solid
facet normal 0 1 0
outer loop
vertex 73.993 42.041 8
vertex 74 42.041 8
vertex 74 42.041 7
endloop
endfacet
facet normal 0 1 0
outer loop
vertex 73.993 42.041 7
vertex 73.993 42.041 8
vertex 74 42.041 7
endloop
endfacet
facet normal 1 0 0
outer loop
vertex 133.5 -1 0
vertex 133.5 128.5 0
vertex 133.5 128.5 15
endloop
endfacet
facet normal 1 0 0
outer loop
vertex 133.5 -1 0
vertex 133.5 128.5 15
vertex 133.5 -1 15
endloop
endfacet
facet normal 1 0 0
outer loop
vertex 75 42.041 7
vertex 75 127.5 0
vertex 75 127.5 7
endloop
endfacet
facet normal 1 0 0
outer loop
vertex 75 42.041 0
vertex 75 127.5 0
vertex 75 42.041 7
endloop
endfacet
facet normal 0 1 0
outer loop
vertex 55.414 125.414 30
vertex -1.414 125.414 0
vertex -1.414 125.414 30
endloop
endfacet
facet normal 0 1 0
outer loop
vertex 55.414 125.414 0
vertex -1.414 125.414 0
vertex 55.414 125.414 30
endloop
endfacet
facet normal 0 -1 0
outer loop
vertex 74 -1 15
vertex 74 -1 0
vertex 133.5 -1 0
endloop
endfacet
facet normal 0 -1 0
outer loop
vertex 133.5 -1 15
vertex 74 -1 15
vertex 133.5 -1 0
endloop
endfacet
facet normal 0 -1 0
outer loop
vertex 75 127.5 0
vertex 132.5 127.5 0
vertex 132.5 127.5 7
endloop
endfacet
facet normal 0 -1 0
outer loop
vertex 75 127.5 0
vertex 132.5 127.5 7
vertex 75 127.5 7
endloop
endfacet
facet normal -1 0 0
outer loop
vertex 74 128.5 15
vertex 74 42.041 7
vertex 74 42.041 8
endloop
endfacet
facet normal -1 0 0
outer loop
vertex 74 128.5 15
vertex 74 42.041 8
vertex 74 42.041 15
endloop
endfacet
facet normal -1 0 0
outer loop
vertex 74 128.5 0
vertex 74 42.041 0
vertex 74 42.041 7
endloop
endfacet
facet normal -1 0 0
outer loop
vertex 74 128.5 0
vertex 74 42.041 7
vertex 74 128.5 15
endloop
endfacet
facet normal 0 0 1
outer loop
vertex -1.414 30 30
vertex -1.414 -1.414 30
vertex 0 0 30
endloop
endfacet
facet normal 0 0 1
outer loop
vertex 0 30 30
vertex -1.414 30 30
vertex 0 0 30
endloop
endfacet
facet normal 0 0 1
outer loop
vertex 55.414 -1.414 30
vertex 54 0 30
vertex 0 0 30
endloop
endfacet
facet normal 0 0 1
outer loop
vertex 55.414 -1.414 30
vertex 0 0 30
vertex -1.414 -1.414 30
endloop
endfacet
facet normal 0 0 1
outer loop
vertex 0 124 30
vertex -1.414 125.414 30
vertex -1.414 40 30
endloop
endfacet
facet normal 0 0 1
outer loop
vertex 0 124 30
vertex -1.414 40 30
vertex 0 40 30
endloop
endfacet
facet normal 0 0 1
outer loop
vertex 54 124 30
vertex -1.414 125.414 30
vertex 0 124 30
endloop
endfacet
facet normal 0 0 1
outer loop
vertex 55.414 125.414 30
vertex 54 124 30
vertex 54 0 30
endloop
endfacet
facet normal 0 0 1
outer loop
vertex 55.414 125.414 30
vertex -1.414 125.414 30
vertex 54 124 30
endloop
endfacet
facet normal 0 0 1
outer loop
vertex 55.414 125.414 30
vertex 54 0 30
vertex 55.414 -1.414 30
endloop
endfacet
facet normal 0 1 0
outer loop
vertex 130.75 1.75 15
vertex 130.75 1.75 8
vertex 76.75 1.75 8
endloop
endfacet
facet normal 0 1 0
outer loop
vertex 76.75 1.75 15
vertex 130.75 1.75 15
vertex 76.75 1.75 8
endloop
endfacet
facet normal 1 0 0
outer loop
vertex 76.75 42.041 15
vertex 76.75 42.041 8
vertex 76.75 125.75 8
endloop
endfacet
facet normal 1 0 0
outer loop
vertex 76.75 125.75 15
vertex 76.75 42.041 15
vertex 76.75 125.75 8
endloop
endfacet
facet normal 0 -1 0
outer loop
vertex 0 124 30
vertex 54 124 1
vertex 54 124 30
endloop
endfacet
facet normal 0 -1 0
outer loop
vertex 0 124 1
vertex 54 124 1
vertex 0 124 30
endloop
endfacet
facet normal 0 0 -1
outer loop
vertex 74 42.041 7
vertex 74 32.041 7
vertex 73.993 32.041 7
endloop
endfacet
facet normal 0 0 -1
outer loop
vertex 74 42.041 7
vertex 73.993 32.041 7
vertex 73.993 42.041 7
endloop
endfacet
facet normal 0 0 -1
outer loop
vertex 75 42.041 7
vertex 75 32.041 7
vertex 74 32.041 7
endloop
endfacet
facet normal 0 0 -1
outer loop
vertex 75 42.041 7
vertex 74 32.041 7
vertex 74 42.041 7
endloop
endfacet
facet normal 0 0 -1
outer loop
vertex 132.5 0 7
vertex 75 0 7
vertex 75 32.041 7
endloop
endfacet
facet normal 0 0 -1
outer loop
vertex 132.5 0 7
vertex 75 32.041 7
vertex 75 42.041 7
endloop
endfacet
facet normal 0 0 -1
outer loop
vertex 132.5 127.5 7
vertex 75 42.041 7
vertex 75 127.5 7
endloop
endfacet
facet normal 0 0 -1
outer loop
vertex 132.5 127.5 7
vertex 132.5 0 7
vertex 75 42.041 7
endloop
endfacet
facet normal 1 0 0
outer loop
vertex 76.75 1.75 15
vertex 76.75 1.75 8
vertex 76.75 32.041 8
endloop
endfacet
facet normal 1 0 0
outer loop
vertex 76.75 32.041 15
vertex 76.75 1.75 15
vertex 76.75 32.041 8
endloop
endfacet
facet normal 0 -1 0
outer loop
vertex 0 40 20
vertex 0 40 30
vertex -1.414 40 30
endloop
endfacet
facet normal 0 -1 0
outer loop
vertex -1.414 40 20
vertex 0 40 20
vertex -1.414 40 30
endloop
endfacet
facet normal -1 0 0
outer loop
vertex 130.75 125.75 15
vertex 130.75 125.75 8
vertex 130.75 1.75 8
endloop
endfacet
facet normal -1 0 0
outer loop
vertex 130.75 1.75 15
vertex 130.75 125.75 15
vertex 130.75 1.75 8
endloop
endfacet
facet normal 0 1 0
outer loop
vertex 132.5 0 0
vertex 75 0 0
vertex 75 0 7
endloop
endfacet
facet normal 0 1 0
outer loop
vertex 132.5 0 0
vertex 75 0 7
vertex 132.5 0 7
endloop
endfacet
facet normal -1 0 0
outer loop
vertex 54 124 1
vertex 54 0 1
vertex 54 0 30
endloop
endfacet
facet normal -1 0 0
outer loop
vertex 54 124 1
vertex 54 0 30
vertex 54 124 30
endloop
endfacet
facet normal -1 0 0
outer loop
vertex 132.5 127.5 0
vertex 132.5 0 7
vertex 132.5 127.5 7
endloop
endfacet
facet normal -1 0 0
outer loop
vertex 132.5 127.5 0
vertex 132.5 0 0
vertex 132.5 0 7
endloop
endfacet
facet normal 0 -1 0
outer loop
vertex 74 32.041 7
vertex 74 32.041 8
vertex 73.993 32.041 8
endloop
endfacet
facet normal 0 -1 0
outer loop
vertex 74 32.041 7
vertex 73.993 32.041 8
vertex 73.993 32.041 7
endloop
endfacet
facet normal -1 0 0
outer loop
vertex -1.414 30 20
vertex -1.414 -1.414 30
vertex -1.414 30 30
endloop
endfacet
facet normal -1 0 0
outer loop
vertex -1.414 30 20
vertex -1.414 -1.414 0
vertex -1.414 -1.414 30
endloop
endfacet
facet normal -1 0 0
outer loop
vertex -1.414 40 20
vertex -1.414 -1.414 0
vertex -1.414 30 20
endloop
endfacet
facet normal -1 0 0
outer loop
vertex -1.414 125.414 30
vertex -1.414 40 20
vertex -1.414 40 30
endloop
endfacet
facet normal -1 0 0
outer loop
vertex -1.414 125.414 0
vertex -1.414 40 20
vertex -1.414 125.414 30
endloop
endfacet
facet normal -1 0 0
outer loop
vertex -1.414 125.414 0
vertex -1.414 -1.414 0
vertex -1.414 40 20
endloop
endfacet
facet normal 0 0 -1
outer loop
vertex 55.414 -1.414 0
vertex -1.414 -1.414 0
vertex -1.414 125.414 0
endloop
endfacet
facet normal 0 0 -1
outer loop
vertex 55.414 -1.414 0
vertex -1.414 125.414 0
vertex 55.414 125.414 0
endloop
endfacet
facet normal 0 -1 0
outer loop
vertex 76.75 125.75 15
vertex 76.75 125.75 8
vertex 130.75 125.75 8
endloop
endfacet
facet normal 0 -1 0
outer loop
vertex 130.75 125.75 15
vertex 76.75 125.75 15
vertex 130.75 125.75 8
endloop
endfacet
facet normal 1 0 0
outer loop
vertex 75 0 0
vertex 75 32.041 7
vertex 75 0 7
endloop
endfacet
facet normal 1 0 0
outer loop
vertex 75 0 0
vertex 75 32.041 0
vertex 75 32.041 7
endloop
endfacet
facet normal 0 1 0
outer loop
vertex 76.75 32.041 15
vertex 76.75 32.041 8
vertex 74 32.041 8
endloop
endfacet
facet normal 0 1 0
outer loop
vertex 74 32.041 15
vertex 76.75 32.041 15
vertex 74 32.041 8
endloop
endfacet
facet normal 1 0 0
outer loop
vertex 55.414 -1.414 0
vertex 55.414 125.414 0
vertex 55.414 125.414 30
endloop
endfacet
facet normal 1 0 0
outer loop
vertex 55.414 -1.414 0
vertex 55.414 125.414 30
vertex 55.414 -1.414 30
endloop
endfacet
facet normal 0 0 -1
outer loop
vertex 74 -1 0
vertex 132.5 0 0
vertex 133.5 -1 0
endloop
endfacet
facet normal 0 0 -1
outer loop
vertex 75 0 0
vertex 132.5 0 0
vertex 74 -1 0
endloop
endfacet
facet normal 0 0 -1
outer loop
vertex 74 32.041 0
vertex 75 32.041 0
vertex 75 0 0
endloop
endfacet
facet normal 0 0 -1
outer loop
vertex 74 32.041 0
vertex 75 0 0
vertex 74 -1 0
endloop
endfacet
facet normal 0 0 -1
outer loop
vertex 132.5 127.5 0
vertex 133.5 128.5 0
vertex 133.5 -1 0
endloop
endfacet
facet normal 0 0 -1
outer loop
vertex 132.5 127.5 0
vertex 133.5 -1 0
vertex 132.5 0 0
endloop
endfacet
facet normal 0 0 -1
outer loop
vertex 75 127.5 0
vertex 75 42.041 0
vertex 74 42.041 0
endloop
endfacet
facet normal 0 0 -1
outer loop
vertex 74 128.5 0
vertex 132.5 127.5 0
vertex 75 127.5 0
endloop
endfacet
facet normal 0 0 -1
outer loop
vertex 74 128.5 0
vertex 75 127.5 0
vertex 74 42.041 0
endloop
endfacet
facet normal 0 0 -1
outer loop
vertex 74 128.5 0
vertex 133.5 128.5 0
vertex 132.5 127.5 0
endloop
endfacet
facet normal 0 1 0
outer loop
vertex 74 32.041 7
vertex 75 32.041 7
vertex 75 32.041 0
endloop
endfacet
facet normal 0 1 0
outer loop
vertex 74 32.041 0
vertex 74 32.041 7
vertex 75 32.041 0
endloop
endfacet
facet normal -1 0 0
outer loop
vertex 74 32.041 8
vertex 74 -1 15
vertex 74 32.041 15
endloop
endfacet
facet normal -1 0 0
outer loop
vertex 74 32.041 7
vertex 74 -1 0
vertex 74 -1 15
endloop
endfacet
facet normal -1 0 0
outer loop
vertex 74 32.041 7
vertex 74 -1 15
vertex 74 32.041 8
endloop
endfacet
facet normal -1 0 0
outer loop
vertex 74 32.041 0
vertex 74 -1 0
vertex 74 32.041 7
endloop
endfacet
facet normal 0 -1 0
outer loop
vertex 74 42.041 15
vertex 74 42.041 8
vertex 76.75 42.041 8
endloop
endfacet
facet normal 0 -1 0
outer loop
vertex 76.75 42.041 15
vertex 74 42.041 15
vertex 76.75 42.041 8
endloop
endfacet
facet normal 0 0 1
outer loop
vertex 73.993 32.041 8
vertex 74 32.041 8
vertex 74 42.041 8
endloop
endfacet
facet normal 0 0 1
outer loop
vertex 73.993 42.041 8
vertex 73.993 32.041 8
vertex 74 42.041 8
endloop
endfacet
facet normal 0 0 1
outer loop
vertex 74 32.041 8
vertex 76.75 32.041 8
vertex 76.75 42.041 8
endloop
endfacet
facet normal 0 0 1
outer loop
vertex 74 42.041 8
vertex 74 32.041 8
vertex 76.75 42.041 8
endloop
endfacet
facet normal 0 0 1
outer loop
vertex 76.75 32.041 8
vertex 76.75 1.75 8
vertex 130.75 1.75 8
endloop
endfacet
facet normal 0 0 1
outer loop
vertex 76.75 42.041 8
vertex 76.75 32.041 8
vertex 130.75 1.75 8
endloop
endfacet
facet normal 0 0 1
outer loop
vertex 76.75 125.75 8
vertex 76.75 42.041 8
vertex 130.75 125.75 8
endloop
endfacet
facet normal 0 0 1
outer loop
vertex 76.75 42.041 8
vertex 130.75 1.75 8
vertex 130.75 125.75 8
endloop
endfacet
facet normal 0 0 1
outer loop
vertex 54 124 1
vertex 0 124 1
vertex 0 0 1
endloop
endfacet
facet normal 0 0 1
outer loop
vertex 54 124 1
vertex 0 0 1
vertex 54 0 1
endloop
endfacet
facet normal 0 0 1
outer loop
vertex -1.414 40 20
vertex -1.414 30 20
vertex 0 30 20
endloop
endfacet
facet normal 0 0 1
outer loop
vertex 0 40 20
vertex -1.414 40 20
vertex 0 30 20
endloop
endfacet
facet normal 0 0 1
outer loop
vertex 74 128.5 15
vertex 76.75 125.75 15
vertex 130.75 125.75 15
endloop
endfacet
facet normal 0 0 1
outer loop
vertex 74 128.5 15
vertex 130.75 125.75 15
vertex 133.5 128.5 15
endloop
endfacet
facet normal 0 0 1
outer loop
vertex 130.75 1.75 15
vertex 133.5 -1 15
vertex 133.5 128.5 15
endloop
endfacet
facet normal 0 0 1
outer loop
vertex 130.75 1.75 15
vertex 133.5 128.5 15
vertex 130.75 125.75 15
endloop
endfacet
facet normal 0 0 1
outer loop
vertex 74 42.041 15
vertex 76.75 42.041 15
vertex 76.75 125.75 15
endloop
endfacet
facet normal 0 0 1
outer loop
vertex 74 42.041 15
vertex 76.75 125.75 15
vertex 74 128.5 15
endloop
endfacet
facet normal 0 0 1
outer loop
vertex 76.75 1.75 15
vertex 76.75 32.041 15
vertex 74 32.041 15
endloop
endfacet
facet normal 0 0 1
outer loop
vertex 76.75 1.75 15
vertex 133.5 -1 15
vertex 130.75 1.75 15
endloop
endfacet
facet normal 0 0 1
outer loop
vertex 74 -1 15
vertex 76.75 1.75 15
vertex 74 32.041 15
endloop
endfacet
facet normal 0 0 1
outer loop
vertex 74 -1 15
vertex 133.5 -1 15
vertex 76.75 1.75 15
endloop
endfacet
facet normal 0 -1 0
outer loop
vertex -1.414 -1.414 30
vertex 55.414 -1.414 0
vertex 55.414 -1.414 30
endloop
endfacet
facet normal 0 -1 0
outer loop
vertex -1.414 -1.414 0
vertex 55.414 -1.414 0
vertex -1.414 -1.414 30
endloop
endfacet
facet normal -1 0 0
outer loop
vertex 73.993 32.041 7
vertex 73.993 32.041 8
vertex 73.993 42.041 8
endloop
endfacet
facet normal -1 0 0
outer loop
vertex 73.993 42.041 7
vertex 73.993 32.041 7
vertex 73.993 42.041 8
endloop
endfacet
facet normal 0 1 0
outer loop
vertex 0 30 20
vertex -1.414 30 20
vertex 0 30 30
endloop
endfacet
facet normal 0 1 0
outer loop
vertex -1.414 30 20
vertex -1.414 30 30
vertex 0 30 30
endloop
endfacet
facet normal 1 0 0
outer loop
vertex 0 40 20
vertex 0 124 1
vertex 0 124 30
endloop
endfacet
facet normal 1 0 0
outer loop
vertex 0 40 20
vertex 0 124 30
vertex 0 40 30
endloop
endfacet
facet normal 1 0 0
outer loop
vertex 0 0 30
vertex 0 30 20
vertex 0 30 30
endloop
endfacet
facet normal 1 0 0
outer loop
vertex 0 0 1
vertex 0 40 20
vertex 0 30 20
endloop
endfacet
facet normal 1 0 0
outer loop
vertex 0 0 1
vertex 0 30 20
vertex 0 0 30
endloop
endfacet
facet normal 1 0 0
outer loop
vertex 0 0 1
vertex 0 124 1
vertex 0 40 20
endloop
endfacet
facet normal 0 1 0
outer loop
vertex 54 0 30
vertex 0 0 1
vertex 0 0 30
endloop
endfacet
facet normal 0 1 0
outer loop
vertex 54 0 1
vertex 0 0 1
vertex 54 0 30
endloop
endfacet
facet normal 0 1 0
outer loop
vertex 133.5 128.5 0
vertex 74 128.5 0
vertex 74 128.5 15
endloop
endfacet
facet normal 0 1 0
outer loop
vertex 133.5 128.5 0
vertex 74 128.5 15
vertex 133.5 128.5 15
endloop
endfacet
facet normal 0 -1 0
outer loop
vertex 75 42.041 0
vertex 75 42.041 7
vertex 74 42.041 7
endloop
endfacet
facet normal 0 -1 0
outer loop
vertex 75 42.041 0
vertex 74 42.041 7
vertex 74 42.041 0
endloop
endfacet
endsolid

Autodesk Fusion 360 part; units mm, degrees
sketch "Sketch1" plane through (0, 0, 0) normal (0, 0, 1) x (1, 0, 0)
  line L0 (0, 0) -> (54, 0)
  line L1 (54, 0) -> (54, 124)
  line L2 (54, 124) -> (0, 124)
  line L3 (0, 124) -> (0, 0)
  line L4 (54, 0) -> (55.4142, -1.4142)
  line L5 (54, 0) -> (56, 0) construction
  line L6 (0, 124) -> (-1.4142, 125.4142)
  line L7 (-1.4142, 125.4142) -> (55.4142, 125.4142)
  line L8 (55.4142, 125.4142) -> (55.4142, -1.4142)
  line L9 (55.4142, -1.4142) -> (-1.4142, -1.4142)
  line L10 (-1.4142, -1.4142) -> (-1.4142, 125.4142)
  dimension "d1" = 54
  dimension "d2" = 124
  dimension "d3" = 2
  dimension "d4" = 45
  dimension "d5" = 2
extrude "Extrude1" add sketch "Sketch1" along normal blind 30 contours L0 L3 L4 L6 L9 L10 | L1 L2 L4 L6 L7 L8 makes body 1
sketch "Sketch2" plane through (0, 0, 0) normal (0, 0, 1) x (1, 0, 0)
  line L0 (-1.4142, -1.4142) -> (55.4142, -1.4142)
  line L1 (55.4142, -1.4142) -> (55.4142, 125.4142)
  line L2 (55.4142, 125.4142) -> (-1.4142, 125.4142)
  line L3 (-1.4142, 125.4142) -> (-1.4142, -1.4142)
  point P0 (-1.4142, -1.4142)
  point P1 (55.4142, 125.4142)
extrude "Extrude2" add sketch "Sketch2" along normal blind 1 bodies 1
sketch "Sketch3" plane through (0, 0, 0) normal (0, 0, 1) x (1, 0, 0)
  line L0 (70, 0) -> (128, 0)
  line L1 (128, 0) -> (128, 128)
  line L2 (128, 128) -> (70, 128)
  line L3 (70, 128) -> (70, 0)
  line L4 (70, 0) -> (70.7071, 0.7071)
  line L5 (128, 128) -> (127.2929, 127.2929)
  line L6 (127.2929, 127.2929) -> (70.7071, 127.2929)
  line L7 (70.7071, 127.2929) -> (70.7071, 0.7071)
  line L8 (70.7071, 0.7071) -> (127.2929, 0.7071)
  line L9 (127.2929, 0.7071) -> (127.2929, 127.2929)
  dimension "d10" = 58
  dimension "d11" = 128
  dimension "d12" = 1
  dimension "d13" = 1
sketch "Sketch8" plane through (0, 0, 30) normal (0, 0, 1) x (1, 0, 0)
  line L0 (0, 0) -> (0, 124)
  line L1 (0, 124) -> (54, 124)
  line L2 (54, 124) -> (54, 0)
  line L3 (54, 0) -> (0, 0)
  line L4 (-1.4142, -1.4142) -> (55.4142, -1.4142)
  line L5 (55.4142, -1.4142) -> (55.4142, 125.4142)
  line L6 (55.4142, 125.4142) -> (-1.4142, 125.4142)
  line L7 (-1.4142, 125.4142) -> (-1.4142, -1.4142)
  line L8 (-1.4142, -1.4142) -> (-1.4142, 29.9998)
  line L9 (-1.4142, 29.9998) -> (0, 29.9998)
  line L10 (0, 29.9998) -> (0, 39.9998)
  line L11 (0, 39.9998) -> (-1.4142, 39.9998)
  line L12 (-1.4142, 39.9998) -> (-1.4142, 29.9998)
  dimension "d30" = 31.414
  dimension "d31" = 10
extrude "Extrude9" cut sketch "Sketch8" against normal blind 10 contours L0 L7 L9 L10 L11 L12 bodies 1
sketch "Sketch9" plane through (0, 0, 0) normal (0, 0, 1) x (1, 0, 0)
  line L0 (75, 0) -> (132.5, 0)
  line L1 (132.5, 0) -> (132.5, 127.5)
  line L2 (132.5, 127.5) -> (75, 127.5)
  line L3 (75, 127.5) -> (75, 0)
  line L4 (75, 127.5) -> (74.2929, 128.2071)
  line L5 (75, 127.5) -> (76, 127.5) construction
  line L6 (132.5, 0) -> (133.2071, -0.7071)
  line L7 (132.5, 0) -> (133.5, 0) construction
  line L8 (133.2071, -0.7071) -> (74.2929, -0.7071)
  line L9 (74.2929, -0.7071) -> (74.2929, 128.2071)
  line L10 (74.2929, 128.2071) -> (133.2071, 128.2071)
  line L11 (133.2071, 128.2071) -> (133.2071, -0.7071)
  dimension "d40" = 57.5
  dimension "d41" = 127.5
  dimension "d42" = 135
  dimension "d43" = 1
  dimension "d44" = 45
  dimension "d45" = 1
extrude "Extrude13" add sketch "Sketch9" along normal blind 7 separate body contours L0 L3 L4 L6 L8 L9 | L1 L2 L4 L6 L10 L11 makes body 2
sketch "Sketch10" plane through (0, 0, 7) normal (0, 0, 1) x (1, 0, 0)
  line L0 (75, 0) -> (75, 127.5)
  line L1 (75, 127.5) -> (132.5, 127.5)
  line L2 (132.5, 127.5) -> (132.5, 0)
  line L3 (132.5, 0) -> (75, 0)
  line L4 (133.2071, 128.2071) -> (74.2929, 128.2071)
  line L5 (74.2929, 128.2071) -> (74.2929, -0.7071)
  line L6 (74.2929, -0.7071) -> (133.2071, -0.7071)
  line L7 (133.2071, -0.7071) -> (133.2071, 128.2071)
extrude "Extrude14" add sketch "Sketch10" along normal blind 1 contours L0 L1 L2 L3 | L4 L5 L6 L7 bodies 2
sketch "Sketch11" plane through (0, 0, 8) normal (0, 0, 1) x (1, 0, 0)
  line L0 (133.2071, -0.7071) -> (133.2071, 128.2071)
  line L1 (133.2071, 128.2071) -> (74.2929, 128.2071)
  line L2 (74.2929, 128.2071) -> (74.2929, -0.7071)
  line L3 (74.2929, -0.7071) -> (133.2071, -0.7071)
  line L4 (133.2071, -0.7071) -> (131.0858, 1.4142)
  line L5 (133.2071, -0.7071) -> (136.2071, -0.7071) construction
  line L6 (74.2929, 128.2071) -> (76.4142, 126.0858)
  line L7 (74.2929, 128.2071) -> (77.2929, 128.2071) construction
  line L8 (76.4142, 126.0858) -> (131.0858, 126.0858)
  line L9 (131.0858, 126.0858) -> (131.0858, 1.4142)
  line L10 (131.0858, 1.4142) -> (76.4142, 1.4142)
  line L11 (76.4142, 1.4142) -> (76.4142, 126.0858)
  dimension "d50" = 135
  dimension "d51" = 3
  dimension "d52" = 45
  dimension "d53" = 3
extrude "Extrude15" add sketch "Sketch11" along normal blind 4 contours L0 L1 L4 L6 L8 L9 | L2 L3 L4 L6 L10 L11 bodies 2
sketch "Sketch12" plane through (0, 0, 12) normal (0, 0, 1) x (1, 0, 0)
  line L0 (131.0858, 1.4142) -> (76.4142, 1.4142)
  line L1 (76.4142, 1.4142) -> (76.4142, 126.0858)
  line L2 (76.4142, 126.0858) -> (131.0858, 126.0858)
  line L3 (131.0858, 126.0858) -> (131.0858, 1.4142)
  line L4 (74.2929, -0.7071) -> (133.2071, -0.7071)
  line L5 (133.2071, -0.7071) -> (133.2071, 128.2071)
  line L6 (133.2071, 128.2071) -> (74.2929, 128.2071)
  line L7 (74.2929, 128.2071) -> (74.2929, -0.7071)
  line L8 (76.4142, 1.4142) -> (76.4142, 32.0412)
  line L9 (76.4142, 32.0412) -> (74.2929, 32.0412)
  line L10 (74.2929, 32.0412) -> (74.2929, 42.0412)
  line L11 (74.2929, 42.0412) -> (76.4142, 42.0412)
  line L12 (76.4142, 42.0412) -> (76.4142, 32.0412)
  dimension "d56" = 30.627
  dimension "d57" = 10
extrude "Extrude16" cut sketch "Sketch12" against normal blind 32 contours L1 L7 L9 L10 L11 L12 bodies 2
extrude "Extrude17" add 1 faces at (76.4142, 35.3745, 7.6667) along direction (-1, 0, 0) blind 2.121 on bodies 2 bodies 2
extrude "Extrude18" add 1 faces at (74.2929, 70.7632, 4) along direction (-1, 0, 0) blind 0.3 on bodies 2 bodies 2
extrude "Extrude19" cut 1 faces at (73.9929, 70.7632, 4) along direction (1, 0, 0) blind 0.007 on bodies 2 bodies 2
extrude "Extrude20" add 1 faces at (74.2929, 21.1251, 8) along direction (-1, 0, 0) blind 0.297 on bodies 2 bodies 2
extrude "Extrude21" cut 1 faces at (73.9959, 21.1251, 8) along direction (1, 0, 0) blind 0.004 on bodies 2 bodies 2
extrude "Extrude22" add 1 faces at (74.2932, 35.3745, 7.6667) along direction (-1, 0, 0) blind 0.3 on bodies 2 bodies 2
extrude "Extrude23" add 1 faces at (133.2071, 85.2357, 4) along direction (1, 0, 0) blind 0.3 on bodies 2 bodies 2
extrude "Extrude24" cut 1 faces at (133.5071, 85.2357, 4) along direction (-1, 0, 0) blind 0.007 on bodies 2 bodies 2
extrude "Extrude25" add 1 faces at (93.8333, 128.2071, 4) along direction (0, 1, 0) blind 0.3 on bodies 2 bodies 2
extrude "Extrude26" cut 1 faces at (93.8333, 128.5071, 4) along direction (0, -1, 0) blind 0.007 on bodies 2 bodies 2
extrude "Extrude27" add 1 faces at (113.6667, -0.7071, 4) along direction (0, -1, 0) blind 0.3 on bodies 2 bodies 2
extrude "Extrude28" cut 1 faces at (113.6667, -1.0071, 4) along direction (0, 1, 0) blind 0.007 on bodies 2 bodies 2
extrude "Extrude29" add 2 faces at (76.4142, 70.0561, 9.3333) (76.4142, 21.8322, 10.6667) along direction (1, 0, 0) blind 0.336 on bodies 2 bodies 2
extrude "Extrude30" add 1 faces at (131.0858, 84.5286, 9.3333) along direction (-1, 0, 0) blind 0.336 on bodies 2 bodies 2
extrude "Extrude31" add 1 faces at (94.7501, 126.0858, 10.6667) along direction (0, -1, 0) blind 0.336 on bodies 2 bodies 2
extrude "Extrude32" add 1 faces at (112.7499, 1.4142, 9.3333) along direction (0, 1, 0) blind 0.336 on bodies 2 bodies 2
extrude "Extrude33" add 1 faces at (132.5833, 84.4166, 12) along direction (0, 0, 1) blind 3 on bodies 2 bodies 2
